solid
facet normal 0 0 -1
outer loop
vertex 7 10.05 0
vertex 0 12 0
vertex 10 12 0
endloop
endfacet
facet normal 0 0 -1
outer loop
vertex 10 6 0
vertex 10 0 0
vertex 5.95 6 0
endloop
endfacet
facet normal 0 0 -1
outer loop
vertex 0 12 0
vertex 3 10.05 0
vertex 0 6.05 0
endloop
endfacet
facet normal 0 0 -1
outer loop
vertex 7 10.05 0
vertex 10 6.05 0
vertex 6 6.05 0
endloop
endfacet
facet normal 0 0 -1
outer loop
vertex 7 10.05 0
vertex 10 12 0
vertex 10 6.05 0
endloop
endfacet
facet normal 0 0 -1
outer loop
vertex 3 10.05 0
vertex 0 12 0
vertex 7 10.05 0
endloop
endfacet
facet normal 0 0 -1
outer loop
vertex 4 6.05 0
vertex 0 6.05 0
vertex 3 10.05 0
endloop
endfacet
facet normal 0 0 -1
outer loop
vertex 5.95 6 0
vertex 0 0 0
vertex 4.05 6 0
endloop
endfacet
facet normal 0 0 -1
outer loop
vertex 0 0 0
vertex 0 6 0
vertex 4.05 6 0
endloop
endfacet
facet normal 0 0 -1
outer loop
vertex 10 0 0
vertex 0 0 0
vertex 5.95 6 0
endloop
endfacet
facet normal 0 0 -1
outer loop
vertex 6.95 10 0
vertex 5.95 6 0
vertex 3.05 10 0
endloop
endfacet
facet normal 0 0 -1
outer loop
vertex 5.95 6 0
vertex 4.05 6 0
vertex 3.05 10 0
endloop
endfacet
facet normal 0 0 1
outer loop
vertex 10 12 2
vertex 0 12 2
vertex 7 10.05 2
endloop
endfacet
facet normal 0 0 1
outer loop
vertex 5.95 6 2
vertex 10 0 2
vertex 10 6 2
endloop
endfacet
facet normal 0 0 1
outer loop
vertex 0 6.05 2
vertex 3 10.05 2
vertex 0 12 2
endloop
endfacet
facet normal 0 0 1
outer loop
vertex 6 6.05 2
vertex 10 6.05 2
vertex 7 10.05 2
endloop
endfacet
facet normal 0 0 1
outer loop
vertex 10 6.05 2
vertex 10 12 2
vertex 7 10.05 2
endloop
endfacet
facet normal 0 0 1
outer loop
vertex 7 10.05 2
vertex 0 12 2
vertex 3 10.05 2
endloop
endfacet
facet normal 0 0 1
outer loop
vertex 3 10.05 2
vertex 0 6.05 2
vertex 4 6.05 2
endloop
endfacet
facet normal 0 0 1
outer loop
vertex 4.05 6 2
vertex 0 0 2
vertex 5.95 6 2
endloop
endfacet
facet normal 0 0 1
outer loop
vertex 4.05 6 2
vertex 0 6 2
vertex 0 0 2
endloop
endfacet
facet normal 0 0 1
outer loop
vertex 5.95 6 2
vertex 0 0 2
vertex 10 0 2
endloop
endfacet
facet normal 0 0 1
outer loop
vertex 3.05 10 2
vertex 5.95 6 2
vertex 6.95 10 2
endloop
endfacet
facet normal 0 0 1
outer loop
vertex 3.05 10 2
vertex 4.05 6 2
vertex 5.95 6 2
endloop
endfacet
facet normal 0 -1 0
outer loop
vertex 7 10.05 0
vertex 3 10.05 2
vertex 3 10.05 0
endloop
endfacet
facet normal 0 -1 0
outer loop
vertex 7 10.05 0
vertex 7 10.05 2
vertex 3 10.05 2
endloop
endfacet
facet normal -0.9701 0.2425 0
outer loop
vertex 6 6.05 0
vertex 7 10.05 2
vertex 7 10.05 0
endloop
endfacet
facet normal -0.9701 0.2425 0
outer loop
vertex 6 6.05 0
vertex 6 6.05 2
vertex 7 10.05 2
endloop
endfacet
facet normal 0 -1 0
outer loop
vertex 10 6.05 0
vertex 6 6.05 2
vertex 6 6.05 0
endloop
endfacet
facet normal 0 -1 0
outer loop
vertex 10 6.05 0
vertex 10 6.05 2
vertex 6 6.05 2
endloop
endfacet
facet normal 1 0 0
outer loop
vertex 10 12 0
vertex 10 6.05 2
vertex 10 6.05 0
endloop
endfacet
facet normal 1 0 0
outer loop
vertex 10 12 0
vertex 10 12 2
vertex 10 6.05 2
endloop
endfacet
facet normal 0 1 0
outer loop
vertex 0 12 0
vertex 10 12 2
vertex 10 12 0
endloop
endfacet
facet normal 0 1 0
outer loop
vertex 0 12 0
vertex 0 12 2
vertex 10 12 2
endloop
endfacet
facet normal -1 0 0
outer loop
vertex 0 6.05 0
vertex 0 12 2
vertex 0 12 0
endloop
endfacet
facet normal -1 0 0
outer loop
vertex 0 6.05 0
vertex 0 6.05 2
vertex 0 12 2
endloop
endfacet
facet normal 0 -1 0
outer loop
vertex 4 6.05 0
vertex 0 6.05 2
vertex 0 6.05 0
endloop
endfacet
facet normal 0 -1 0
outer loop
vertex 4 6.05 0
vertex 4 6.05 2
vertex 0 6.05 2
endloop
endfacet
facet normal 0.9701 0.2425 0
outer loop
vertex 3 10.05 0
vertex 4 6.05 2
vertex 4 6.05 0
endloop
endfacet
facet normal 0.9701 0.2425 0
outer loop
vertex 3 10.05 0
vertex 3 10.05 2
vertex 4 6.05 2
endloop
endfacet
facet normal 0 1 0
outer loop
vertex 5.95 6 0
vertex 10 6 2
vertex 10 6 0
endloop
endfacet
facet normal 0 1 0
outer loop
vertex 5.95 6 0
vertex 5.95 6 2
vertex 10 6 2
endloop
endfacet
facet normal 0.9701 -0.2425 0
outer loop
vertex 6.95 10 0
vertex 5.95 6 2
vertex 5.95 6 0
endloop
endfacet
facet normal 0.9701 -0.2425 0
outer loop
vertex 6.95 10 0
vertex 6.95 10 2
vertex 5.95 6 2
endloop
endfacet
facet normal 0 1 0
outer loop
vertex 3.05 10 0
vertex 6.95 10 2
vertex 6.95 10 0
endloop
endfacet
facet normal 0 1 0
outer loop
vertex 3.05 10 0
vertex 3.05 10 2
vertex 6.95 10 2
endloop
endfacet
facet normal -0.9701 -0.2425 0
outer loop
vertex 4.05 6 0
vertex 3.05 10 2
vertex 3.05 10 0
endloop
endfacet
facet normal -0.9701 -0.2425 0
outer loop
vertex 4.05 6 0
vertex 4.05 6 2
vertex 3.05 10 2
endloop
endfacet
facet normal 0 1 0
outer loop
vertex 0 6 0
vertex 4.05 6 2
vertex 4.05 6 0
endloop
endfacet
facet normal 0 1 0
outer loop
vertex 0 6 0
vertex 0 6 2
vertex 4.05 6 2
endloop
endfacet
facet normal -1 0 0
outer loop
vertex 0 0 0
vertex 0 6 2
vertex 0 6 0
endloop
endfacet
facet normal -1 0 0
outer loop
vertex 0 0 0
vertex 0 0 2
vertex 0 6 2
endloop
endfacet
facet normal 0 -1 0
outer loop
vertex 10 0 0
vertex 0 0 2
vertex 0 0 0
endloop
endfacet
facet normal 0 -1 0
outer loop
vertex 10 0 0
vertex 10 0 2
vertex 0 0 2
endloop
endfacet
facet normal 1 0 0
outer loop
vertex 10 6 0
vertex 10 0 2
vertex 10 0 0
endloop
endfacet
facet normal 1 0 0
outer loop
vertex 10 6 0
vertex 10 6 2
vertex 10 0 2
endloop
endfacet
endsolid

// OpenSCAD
/*
 * @file parametric_short_example.scad
 * @brief Short example of a parametric model
 * @copyright Cameron K. Brooks 2025
 * @license CC-BY-SA-4.0
 * @details This is a short example of a parametric model that creates a dovetail joint.
 */

X = 10; // Width of the base
Y = 6; // Length of the object

A = 4; // Length of the dovetail
B = 2; // Width of the top edge of the dovetail
C = 4; // Width of the lower edge of the dovetail
D = 0.1; // Delta value for allowance

H = 2; // Height of the object

// Module to define a 2D polygon
module base_shape(X, Y, A, B, C, D, M = false) {
  AA = M ? A : -A; // Invert the dovetail if female
  BB = M ? B - D : B; // Apply allowance to male B dimension
  CC = M ? C - D : C; // Apply allowance to male C dimension
  polygon(
    points=[
      [0, 0], // Bottom-left corner
      [X, 0], // Bottom-right corner
      [X, Y], // Top-right corner
      [X / 2 - BB / 2, Y], // Top-right corner of the dovetail
      [X / 2 - CC / 2, Y + AA], // Bottom-right corner of the dovetail
      [X / 2 + CC / 2, Y + AA], // Bottom-left corner of the dovetail
      [X / 2 + BB / 2, Y], // Top-left corner of the dovetail
      [0, Y], // Top-left corner
    ]
  );
}

// Linear extrusion to create the 3D object
linear_extrude(H) {
  base_shape(X, Y, A, B, C, D, true);
  mirror([0, 1, 0]) translate([0, -Y * 2, 0]) base_shape(X, Y - D / 2, A, B, C, D, false);
}
